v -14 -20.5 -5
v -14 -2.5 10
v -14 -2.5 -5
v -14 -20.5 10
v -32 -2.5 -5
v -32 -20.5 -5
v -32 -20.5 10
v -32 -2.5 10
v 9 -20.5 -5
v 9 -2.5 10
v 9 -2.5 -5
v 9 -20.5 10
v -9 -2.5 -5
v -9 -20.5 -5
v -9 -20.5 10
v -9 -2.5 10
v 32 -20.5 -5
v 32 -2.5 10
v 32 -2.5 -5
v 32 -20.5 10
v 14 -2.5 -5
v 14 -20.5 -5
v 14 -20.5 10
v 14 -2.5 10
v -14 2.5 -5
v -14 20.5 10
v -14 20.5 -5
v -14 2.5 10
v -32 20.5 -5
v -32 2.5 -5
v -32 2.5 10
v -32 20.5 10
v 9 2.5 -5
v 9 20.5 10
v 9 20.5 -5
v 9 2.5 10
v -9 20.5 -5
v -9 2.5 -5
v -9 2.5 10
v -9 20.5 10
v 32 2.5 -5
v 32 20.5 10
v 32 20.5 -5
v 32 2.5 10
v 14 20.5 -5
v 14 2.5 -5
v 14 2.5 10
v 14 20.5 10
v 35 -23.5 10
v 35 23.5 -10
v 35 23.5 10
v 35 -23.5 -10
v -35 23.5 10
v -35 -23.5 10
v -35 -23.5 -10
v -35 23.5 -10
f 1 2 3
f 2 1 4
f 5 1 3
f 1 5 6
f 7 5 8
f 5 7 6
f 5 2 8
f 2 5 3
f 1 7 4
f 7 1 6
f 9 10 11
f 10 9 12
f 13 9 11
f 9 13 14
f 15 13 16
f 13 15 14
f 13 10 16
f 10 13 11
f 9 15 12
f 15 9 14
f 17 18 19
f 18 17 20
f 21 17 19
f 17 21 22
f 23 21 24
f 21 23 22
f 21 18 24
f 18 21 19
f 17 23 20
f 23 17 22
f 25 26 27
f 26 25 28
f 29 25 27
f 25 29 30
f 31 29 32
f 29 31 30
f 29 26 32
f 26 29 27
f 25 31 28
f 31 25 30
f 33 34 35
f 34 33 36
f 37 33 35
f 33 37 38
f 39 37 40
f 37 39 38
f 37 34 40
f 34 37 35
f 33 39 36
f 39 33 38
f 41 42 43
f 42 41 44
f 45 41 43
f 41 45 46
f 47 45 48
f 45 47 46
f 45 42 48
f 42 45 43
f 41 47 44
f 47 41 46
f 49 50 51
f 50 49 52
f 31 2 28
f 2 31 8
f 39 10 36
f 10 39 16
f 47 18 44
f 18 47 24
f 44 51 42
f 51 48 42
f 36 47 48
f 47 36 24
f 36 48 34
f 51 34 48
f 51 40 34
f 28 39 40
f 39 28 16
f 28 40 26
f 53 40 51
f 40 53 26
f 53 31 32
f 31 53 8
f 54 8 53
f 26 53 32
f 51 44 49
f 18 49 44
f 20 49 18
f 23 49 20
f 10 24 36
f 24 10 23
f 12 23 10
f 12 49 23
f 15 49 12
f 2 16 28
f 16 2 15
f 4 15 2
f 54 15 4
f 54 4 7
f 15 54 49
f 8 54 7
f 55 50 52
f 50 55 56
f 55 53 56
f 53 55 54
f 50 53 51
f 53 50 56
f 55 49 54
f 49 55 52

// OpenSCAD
$fn = 32;

// ----------------------------------------------------------------------
// Pocket plate 70 x 47 x 20
// 2 x 3 pockets 18 mm square, 15 mm deep
// ----------------------------------------------------------------------

// --- parameters (mm) ---
thickness = 20;  // plate thickness
floor_t = 5;     // material left under each pocket
pocket = 18;     // pocket side length
pitch_x = 23;    // pocket pitch along X
pitch_y = 23;    // pocket pitch along Y
cols = 3;        // pockets per row
rows = 2;        // rows of pockets

// --- derived feature positions (mm) ---
depth = thickness - floor_t;        // = 15   pocket depth, down to the floor
span_x = (cols - 1) * pitch_x;      // = 46   distance between outer pockets
span_y = (rows - 1) * pitch_y;      // = 23   distance between outer pocket rows
origin_x = -span_x / 2;             // = -23   X of the first pocket
origin_y = -span_y / 2;             // = -11.5   Y of the first pocket
plate = [span_x + pocket + 6, span_y + pocket + 6, thickness];  // = [70, 47, 20]   overall size: pockets plus 3 mm of wall on each side
feature_centers = [
  [origin_x + 0 * pitch_x, origin_y + 0 * pitch_y],
  [origin_x + 1 * pitch_x, origin_y + 0 * pitch_y],
  [origin_x + 2 * pitch_x, origin_y + 0 * pitch_y],
  [origin_x + 0 * pitch_x, origin_y + 1 * pitch_y],
  [origin_x + 1 * pitch_x, origin_y + 1 * pitch_y],
  [origin_x + 2 * pitch_x, origin_y + 1 * pitch_y]
];   // pocket centres, used verbatim by the cutter loop

// plate outline, then one pocket per centre in feature_centers
difference() {
  cube(plate, center = true);
  for (centre = feature_centers)
    translate([centre[0] - pocket / 2, centre[1] - pocket / 2, plate[2] / 2 - depth])
      cube([pocket, pocket, depth + 1]);  // centred on the declared pocket centre
}
